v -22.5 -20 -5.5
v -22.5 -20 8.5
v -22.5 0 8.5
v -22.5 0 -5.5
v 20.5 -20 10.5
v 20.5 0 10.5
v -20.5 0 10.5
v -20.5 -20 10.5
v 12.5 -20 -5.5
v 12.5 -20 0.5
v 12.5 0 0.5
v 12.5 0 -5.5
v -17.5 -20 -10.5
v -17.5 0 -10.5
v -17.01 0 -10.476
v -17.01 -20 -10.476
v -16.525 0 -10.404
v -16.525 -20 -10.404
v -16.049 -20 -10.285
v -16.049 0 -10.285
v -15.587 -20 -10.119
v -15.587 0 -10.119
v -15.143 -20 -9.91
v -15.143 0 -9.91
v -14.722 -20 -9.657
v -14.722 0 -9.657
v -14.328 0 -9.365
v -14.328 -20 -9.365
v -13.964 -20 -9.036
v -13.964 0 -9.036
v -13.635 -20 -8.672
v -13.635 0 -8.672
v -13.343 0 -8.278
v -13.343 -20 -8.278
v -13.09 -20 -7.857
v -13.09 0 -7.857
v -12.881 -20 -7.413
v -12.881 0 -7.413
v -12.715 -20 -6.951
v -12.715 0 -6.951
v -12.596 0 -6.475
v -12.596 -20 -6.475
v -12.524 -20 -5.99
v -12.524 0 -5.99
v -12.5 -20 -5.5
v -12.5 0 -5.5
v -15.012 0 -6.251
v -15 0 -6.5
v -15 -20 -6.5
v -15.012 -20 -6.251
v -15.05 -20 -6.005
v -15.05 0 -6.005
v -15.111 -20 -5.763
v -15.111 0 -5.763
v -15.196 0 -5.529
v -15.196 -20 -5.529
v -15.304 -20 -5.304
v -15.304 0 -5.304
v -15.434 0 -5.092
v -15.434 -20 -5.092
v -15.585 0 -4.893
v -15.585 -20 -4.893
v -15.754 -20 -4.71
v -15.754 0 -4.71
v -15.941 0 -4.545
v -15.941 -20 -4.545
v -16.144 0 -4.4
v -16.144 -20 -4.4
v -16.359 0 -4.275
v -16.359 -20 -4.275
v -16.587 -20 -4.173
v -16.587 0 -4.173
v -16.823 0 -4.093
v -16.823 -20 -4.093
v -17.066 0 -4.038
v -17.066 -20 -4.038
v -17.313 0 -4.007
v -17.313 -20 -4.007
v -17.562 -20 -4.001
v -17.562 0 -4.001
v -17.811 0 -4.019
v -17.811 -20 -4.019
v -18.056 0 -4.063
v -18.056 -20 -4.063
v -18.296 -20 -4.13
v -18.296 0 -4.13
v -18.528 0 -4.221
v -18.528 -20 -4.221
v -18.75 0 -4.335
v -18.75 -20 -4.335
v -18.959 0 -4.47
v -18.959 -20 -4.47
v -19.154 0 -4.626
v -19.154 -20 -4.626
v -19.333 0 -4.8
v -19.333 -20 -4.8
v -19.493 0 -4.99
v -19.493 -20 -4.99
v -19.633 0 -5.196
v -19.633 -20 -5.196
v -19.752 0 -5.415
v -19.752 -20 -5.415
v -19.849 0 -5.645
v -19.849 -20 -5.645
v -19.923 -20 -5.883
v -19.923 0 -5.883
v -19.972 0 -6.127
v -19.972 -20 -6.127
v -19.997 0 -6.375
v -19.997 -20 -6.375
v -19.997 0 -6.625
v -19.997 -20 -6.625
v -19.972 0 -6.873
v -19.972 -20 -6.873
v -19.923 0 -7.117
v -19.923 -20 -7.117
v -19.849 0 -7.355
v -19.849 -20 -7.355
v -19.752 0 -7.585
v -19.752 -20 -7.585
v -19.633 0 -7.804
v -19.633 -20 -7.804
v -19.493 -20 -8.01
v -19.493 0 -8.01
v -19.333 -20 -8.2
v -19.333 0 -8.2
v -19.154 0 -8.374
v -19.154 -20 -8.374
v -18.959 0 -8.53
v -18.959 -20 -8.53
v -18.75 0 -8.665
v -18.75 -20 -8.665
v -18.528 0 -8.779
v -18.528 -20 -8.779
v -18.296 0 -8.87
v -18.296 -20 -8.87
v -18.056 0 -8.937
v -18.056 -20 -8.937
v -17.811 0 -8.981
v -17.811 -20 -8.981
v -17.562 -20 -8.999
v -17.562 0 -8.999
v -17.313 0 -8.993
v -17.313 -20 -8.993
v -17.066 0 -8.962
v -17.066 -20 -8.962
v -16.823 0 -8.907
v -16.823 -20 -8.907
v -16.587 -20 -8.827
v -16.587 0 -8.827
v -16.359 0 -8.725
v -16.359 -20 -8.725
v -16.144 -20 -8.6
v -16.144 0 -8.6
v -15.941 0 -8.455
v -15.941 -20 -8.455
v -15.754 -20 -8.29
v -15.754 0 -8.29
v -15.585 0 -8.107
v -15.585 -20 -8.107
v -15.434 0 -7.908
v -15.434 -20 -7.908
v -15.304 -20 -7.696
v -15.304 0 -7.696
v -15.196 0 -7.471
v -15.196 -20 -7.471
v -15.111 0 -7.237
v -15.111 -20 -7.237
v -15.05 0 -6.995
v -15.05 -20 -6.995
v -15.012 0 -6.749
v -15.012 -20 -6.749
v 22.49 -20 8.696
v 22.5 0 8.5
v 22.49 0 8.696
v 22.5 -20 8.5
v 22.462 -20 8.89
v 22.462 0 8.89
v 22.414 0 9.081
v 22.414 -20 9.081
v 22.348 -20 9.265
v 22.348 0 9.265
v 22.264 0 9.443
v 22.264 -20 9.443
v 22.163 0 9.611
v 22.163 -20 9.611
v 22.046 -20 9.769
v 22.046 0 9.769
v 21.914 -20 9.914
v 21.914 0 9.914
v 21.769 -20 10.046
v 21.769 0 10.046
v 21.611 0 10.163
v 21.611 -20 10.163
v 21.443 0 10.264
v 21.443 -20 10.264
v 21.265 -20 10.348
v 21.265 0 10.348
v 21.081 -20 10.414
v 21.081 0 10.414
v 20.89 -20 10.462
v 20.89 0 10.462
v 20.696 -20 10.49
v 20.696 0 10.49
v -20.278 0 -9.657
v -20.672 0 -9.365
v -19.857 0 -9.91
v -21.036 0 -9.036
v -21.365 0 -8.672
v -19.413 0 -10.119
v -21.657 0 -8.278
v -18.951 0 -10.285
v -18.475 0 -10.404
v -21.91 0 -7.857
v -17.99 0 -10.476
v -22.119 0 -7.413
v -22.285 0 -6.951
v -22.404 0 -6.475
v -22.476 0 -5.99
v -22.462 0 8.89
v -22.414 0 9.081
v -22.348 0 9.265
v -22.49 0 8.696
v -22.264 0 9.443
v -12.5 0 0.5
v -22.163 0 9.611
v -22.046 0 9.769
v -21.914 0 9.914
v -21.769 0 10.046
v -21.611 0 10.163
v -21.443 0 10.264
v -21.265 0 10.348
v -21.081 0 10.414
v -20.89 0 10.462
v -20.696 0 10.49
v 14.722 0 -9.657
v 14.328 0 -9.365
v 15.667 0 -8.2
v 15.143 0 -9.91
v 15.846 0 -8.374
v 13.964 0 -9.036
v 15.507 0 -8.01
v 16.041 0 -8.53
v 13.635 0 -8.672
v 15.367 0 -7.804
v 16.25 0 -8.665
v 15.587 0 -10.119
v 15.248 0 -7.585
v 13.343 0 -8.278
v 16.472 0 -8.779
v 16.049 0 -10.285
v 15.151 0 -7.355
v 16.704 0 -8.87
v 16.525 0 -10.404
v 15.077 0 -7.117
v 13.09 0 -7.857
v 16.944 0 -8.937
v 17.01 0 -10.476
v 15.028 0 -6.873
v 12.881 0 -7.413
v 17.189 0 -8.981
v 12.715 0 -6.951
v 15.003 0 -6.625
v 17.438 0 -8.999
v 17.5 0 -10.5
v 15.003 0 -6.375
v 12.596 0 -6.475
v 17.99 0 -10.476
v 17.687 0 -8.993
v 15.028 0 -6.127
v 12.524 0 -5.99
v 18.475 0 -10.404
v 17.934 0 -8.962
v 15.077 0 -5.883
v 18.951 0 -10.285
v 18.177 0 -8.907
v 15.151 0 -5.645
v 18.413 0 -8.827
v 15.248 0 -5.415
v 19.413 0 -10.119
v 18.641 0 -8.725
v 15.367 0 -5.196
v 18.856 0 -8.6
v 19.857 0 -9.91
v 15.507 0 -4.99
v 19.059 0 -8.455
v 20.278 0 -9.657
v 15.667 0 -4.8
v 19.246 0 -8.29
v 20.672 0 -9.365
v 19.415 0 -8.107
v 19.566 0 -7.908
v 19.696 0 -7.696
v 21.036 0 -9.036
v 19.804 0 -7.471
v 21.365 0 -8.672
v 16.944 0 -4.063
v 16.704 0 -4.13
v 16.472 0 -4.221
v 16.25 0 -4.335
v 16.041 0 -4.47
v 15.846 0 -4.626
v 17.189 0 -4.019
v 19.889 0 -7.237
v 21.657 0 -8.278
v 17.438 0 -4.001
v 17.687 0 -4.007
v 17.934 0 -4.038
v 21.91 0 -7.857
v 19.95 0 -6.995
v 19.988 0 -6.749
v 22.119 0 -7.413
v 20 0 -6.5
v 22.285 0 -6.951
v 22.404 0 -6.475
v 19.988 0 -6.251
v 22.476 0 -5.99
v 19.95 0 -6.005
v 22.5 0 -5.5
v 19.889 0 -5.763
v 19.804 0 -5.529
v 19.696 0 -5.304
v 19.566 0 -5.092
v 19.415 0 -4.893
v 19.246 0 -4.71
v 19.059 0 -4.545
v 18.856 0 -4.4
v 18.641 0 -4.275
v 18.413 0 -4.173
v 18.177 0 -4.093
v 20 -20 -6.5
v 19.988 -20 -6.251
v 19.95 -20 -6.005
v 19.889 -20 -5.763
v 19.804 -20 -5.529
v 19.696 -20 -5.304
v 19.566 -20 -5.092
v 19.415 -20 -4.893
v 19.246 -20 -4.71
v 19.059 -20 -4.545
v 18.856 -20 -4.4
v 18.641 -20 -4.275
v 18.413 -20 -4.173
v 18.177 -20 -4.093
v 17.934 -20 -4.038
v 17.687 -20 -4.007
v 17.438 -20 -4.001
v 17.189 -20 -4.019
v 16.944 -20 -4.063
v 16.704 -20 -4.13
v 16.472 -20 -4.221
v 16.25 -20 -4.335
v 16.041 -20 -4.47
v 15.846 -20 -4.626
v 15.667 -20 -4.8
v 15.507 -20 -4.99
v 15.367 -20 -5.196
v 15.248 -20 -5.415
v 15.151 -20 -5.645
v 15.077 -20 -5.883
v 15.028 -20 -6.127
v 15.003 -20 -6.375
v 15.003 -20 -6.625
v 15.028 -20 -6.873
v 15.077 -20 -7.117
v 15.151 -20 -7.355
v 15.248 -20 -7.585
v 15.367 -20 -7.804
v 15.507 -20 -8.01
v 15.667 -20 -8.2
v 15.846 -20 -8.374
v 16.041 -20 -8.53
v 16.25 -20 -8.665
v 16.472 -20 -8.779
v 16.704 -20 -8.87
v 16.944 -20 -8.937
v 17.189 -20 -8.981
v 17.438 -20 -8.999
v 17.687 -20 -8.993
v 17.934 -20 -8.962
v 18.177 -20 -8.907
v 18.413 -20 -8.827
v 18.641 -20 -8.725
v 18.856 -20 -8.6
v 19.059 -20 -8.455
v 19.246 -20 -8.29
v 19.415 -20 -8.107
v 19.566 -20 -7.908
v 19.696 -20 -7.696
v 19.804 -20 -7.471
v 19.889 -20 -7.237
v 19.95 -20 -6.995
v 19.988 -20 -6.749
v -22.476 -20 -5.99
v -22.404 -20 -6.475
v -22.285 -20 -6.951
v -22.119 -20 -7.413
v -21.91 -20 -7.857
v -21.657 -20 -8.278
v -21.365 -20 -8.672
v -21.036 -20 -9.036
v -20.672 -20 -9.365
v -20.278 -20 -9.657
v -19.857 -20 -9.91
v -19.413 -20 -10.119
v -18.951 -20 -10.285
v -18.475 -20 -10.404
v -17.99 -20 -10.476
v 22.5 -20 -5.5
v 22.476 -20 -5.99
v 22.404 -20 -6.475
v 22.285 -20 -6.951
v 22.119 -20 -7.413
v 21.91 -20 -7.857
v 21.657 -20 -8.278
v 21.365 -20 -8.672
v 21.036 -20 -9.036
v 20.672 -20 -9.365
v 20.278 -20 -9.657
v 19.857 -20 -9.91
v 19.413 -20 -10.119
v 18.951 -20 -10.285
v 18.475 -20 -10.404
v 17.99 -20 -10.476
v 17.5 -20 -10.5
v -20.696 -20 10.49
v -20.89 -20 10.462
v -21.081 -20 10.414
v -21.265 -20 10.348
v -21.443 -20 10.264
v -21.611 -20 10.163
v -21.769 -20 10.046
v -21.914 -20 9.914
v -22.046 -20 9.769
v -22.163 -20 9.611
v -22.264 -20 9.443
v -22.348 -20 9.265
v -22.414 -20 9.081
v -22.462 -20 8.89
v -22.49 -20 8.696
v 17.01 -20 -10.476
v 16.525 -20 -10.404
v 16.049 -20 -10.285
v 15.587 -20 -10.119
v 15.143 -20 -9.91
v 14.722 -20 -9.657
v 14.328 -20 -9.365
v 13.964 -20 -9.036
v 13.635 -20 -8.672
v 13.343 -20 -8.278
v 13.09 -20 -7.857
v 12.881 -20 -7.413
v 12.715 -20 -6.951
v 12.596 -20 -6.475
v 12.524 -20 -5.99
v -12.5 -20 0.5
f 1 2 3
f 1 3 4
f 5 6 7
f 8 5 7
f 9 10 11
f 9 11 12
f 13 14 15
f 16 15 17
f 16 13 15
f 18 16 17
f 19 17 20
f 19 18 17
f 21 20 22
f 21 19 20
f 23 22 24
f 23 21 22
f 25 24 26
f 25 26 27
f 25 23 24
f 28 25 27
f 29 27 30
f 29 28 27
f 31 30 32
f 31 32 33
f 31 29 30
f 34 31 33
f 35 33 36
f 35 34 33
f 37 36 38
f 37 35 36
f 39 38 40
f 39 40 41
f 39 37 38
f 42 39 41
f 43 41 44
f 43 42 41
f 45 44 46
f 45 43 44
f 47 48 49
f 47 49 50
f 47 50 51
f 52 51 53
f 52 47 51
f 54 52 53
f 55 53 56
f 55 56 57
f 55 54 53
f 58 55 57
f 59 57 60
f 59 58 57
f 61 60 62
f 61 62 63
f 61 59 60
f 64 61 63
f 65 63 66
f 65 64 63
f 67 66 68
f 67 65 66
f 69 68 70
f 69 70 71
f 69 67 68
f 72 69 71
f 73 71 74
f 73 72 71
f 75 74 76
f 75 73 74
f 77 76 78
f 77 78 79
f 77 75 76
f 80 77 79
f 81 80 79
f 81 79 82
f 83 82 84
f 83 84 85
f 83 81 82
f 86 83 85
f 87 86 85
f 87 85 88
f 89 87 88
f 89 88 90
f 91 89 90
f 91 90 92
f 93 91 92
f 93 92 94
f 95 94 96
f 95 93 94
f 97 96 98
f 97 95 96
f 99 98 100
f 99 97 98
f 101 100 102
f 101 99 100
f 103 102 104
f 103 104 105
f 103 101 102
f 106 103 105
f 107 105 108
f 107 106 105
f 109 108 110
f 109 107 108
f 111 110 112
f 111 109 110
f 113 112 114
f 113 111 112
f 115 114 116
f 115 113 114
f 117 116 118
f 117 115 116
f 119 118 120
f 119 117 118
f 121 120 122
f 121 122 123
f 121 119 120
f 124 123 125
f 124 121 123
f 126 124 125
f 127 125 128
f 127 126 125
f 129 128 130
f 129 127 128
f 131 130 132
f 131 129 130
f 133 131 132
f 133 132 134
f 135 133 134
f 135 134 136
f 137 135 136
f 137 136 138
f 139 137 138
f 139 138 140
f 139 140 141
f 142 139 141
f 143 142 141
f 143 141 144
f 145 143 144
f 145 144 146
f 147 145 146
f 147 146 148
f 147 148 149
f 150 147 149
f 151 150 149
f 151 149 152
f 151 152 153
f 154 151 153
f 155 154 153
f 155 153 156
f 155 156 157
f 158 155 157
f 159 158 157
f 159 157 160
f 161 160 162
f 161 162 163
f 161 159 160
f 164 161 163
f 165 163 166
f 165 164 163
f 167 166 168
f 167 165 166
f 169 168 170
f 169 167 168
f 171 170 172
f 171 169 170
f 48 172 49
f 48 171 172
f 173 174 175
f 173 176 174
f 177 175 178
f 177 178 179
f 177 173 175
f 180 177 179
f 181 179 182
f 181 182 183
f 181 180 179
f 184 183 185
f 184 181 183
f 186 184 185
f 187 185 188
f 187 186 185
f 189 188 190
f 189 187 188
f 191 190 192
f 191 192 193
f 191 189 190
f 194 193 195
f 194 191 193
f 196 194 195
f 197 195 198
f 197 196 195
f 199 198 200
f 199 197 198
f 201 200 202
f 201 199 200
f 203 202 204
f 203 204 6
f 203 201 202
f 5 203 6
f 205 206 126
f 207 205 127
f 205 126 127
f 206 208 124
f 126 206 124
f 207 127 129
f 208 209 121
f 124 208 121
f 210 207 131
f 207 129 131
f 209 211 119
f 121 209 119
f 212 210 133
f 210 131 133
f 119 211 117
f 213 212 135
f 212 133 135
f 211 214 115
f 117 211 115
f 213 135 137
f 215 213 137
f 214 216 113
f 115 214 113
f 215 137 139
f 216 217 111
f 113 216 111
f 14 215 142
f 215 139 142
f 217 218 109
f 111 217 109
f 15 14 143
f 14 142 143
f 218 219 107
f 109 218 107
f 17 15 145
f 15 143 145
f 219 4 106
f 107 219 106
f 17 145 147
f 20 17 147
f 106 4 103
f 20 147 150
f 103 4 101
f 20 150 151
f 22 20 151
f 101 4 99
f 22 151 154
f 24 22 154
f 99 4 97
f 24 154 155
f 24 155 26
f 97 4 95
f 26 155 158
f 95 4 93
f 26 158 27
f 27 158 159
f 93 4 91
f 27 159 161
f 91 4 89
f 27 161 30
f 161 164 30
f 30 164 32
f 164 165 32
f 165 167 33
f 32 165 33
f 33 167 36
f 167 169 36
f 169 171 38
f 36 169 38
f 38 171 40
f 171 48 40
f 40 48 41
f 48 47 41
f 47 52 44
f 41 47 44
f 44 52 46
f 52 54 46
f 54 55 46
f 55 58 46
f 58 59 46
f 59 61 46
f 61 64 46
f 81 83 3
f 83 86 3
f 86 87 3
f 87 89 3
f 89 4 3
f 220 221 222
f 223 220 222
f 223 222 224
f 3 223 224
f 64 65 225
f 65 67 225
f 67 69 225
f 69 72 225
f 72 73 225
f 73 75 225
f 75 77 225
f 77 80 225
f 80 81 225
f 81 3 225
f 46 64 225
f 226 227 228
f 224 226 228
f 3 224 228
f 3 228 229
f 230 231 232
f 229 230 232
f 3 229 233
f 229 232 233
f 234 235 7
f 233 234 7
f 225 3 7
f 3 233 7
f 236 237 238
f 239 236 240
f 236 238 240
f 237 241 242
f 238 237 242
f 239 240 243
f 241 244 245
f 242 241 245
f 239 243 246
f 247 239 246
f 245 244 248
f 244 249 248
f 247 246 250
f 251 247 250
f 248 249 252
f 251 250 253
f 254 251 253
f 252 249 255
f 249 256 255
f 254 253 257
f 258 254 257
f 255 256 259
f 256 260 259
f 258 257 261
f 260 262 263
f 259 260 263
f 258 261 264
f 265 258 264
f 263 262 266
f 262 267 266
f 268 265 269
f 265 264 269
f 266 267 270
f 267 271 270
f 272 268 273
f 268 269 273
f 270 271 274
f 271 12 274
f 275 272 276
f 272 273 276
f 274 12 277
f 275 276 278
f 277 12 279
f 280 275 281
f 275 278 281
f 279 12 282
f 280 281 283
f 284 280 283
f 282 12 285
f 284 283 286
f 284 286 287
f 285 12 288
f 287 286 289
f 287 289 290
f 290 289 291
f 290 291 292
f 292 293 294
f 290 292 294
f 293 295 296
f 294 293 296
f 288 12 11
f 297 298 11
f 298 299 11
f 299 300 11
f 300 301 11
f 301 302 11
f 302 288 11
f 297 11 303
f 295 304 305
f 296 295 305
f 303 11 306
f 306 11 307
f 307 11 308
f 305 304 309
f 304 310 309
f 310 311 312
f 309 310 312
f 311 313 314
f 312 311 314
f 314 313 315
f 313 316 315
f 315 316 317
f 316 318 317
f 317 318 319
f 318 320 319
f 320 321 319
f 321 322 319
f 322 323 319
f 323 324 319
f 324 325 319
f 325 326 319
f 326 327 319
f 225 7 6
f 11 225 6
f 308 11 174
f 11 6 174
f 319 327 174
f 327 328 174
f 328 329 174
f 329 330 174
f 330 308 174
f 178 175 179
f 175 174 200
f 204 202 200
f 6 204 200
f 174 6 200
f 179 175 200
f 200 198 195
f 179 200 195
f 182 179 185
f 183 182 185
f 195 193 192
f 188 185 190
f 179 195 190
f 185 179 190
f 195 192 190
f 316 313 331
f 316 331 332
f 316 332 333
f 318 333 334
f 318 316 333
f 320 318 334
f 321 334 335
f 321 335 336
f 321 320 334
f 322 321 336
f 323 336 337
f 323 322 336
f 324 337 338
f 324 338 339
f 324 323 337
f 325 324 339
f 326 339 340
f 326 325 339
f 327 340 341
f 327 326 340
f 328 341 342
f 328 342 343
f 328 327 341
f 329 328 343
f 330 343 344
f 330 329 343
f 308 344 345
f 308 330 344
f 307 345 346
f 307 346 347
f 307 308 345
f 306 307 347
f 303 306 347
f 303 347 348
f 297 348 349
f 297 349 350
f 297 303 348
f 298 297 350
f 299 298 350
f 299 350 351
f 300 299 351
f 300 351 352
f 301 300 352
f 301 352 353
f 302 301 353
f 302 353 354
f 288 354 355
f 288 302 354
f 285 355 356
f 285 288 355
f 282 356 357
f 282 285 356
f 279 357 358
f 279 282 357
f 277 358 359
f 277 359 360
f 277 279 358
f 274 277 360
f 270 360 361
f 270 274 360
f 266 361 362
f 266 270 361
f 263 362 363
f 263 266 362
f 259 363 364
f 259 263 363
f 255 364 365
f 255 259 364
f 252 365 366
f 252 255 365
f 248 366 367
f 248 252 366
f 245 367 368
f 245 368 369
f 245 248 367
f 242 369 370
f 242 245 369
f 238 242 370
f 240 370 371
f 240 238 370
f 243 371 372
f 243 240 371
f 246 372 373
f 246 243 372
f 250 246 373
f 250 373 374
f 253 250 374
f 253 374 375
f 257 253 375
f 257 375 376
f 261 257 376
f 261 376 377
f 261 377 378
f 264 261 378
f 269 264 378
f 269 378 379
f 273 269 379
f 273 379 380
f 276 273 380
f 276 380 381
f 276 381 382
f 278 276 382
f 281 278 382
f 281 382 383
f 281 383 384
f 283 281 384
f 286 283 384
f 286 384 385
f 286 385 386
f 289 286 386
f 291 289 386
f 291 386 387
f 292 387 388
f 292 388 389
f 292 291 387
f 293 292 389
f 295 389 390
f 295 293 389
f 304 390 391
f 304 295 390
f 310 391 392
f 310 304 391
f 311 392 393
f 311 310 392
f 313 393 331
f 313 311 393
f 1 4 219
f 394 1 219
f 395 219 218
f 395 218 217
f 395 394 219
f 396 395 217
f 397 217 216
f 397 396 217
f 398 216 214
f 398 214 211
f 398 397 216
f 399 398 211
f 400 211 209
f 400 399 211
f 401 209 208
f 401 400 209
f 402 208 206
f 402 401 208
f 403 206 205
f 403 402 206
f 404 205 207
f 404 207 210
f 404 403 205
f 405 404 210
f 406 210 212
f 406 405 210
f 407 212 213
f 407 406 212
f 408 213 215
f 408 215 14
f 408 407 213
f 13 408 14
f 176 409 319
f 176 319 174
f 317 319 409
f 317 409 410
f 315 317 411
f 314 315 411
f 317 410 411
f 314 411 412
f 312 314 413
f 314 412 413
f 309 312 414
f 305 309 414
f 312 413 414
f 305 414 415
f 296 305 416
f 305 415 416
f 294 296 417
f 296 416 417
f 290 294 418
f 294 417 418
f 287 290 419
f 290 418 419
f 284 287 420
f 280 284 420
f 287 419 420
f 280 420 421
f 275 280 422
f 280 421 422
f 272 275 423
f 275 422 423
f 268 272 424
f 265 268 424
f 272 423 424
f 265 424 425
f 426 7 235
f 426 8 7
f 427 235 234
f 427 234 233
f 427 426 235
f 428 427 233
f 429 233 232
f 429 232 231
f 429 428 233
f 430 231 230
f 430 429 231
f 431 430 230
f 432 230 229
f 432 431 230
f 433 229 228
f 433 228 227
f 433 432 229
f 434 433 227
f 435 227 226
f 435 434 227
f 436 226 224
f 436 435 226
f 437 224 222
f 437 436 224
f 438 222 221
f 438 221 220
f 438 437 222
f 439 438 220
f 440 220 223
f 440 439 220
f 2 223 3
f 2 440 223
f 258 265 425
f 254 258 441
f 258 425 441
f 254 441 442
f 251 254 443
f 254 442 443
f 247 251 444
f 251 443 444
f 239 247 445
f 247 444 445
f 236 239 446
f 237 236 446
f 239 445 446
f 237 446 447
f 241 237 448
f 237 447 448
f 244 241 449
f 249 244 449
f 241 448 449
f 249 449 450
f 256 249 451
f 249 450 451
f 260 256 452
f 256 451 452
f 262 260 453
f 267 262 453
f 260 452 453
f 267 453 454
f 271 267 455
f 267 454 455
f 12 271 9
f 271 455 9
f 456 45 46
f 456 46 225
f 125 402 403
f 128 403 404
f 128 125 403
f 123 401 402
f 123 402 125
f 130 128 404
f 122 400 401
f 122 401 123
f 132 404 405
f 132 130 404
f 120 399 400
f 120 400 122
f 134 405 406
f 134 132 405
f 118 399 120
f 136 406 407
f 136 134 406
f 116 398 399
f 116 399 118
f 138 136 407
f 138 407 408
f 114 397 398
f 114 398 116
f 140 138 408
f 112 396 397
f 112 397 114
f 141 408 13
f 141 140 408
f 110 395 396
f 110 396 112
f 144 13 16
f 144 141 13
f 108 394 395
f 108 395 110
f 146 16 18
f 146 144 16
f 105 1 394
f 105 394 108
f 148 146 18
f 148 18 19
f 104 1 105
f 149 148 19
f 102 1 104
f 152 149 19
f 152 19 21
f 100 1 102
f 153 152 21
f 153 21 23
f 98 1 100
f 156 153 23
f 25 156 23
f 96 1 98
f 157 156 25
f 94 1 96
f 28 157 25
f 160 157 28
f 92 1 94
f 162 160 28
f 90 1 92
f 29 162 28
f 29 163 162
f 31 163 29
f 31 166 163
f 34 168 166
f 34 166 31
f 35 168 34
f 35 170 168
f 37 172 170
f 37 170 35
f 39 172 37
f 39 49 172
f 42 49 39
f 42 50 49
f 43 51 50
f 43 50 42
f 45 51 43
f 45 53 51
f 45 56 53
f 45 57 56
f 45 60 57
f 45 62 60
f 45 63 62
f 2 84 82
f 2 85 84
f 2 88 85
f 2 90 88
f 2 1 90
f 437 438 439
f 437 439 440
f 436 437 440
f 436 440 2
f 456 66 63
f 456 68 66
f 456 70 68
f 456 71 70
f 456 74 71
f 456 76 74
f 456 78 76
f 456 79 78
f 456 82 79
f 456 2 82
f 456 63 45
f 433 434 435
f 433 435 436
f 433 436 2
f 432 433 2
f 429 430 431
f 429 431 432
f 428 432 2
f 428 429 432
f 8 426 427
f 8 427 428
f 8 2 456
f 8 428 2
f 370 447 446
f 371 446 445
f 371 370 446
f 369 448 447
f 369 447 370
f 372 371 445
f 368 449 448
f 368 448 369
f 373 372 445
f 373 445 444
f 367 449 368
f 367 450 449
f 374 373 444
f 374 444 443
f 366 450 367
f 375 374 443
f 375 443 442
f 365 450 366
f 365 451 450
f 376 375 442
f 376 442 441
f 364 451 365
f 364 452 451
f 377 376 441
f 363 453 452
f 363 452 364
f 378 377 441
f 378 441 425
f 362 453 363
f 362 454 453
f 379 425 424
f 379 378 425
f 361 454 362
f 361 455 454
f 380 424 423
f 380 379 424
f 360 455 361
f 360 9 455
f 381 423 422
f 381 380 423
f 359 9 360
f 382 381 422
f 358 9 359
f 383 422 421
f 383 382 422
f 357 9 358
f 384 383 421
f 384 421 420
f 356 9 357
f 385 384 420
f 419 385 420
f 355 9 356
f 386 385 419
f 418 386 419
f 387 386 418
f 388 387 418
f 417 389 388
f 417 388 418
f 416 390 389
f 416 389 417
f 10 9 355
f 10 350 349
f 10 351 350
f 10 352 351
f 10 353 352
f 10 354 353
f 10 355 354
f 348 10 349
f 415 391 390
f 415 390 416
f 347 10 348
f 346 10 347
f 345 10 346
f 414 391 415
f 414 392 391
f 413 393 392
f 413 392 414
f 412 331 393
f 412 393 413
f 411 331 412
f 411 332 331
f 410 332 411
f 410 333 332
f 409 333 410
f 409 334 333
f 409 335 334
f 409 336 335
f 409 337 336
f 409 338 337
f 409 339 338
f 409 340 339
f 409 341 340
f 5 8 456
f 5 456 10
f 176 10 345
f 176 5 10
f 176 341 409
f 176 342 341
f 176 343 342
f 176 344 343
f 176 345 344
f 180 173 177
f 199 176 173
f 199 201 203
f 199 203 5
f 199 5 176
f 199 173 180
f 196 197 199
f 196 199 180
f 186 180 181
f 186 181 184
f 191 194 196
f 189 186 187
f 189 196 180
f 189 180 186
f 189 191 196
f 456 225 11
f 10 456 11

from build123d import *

# Parameters (mm, degrees)
F0_R     = 2.5
F1_DEPTH = 20
F2_R     = 4.99999
F3_R     = 2


# Not quite as in the source:
# - a fillet or chamfer is up to 0.001 mm smaller than in the source, because OpenCascade refuses the exact size


with BuildPart() as f1:
    # F0 (on Front) → F1 (new body)
    with BuildSketch(Plane.XZ):
        Polygon((22.5, 10.5), (-22.5, 10.5), (-22.5, -10.5), (-12.5, -10.5), (-12.5, 0.5), (12.5, 0.5), (12.5, -10.5), (22.5, -10.5), align=None)
        with Locations((-17.5, -6.5)):
            Circle(F0_R, mode=Mode.SUBTRACT)
        with Locations((17.5, -6.5)):
            Circle(F0_R, mode=Mode.SUBTRACT)
    extrude(amount=F1_DEPTH)

    # F2 (radius 5 in the source; OpenCascade refuses exactly that, so slightly less here)
    f2_edges = [f1.edges().sort_by_distance(p)[0] for p in [
        (-22.5, -10, -10.5),
        (-12.5, -10, -10.5),
        (12.5, -10, -10.5),
        (22.5, -10, -10.5),
    ]]
    fillet(f2_edges, radius=F2_R)

    # F3
    f3_edges = [f1.edges().sort_by_distance(p)[0] for p in [
        (22.5, -10, 10.5),
        (-22.5, -10, 10.5),
    ]]
    fillet(f3_edges, radius=F3_R)


solid = f1.part
